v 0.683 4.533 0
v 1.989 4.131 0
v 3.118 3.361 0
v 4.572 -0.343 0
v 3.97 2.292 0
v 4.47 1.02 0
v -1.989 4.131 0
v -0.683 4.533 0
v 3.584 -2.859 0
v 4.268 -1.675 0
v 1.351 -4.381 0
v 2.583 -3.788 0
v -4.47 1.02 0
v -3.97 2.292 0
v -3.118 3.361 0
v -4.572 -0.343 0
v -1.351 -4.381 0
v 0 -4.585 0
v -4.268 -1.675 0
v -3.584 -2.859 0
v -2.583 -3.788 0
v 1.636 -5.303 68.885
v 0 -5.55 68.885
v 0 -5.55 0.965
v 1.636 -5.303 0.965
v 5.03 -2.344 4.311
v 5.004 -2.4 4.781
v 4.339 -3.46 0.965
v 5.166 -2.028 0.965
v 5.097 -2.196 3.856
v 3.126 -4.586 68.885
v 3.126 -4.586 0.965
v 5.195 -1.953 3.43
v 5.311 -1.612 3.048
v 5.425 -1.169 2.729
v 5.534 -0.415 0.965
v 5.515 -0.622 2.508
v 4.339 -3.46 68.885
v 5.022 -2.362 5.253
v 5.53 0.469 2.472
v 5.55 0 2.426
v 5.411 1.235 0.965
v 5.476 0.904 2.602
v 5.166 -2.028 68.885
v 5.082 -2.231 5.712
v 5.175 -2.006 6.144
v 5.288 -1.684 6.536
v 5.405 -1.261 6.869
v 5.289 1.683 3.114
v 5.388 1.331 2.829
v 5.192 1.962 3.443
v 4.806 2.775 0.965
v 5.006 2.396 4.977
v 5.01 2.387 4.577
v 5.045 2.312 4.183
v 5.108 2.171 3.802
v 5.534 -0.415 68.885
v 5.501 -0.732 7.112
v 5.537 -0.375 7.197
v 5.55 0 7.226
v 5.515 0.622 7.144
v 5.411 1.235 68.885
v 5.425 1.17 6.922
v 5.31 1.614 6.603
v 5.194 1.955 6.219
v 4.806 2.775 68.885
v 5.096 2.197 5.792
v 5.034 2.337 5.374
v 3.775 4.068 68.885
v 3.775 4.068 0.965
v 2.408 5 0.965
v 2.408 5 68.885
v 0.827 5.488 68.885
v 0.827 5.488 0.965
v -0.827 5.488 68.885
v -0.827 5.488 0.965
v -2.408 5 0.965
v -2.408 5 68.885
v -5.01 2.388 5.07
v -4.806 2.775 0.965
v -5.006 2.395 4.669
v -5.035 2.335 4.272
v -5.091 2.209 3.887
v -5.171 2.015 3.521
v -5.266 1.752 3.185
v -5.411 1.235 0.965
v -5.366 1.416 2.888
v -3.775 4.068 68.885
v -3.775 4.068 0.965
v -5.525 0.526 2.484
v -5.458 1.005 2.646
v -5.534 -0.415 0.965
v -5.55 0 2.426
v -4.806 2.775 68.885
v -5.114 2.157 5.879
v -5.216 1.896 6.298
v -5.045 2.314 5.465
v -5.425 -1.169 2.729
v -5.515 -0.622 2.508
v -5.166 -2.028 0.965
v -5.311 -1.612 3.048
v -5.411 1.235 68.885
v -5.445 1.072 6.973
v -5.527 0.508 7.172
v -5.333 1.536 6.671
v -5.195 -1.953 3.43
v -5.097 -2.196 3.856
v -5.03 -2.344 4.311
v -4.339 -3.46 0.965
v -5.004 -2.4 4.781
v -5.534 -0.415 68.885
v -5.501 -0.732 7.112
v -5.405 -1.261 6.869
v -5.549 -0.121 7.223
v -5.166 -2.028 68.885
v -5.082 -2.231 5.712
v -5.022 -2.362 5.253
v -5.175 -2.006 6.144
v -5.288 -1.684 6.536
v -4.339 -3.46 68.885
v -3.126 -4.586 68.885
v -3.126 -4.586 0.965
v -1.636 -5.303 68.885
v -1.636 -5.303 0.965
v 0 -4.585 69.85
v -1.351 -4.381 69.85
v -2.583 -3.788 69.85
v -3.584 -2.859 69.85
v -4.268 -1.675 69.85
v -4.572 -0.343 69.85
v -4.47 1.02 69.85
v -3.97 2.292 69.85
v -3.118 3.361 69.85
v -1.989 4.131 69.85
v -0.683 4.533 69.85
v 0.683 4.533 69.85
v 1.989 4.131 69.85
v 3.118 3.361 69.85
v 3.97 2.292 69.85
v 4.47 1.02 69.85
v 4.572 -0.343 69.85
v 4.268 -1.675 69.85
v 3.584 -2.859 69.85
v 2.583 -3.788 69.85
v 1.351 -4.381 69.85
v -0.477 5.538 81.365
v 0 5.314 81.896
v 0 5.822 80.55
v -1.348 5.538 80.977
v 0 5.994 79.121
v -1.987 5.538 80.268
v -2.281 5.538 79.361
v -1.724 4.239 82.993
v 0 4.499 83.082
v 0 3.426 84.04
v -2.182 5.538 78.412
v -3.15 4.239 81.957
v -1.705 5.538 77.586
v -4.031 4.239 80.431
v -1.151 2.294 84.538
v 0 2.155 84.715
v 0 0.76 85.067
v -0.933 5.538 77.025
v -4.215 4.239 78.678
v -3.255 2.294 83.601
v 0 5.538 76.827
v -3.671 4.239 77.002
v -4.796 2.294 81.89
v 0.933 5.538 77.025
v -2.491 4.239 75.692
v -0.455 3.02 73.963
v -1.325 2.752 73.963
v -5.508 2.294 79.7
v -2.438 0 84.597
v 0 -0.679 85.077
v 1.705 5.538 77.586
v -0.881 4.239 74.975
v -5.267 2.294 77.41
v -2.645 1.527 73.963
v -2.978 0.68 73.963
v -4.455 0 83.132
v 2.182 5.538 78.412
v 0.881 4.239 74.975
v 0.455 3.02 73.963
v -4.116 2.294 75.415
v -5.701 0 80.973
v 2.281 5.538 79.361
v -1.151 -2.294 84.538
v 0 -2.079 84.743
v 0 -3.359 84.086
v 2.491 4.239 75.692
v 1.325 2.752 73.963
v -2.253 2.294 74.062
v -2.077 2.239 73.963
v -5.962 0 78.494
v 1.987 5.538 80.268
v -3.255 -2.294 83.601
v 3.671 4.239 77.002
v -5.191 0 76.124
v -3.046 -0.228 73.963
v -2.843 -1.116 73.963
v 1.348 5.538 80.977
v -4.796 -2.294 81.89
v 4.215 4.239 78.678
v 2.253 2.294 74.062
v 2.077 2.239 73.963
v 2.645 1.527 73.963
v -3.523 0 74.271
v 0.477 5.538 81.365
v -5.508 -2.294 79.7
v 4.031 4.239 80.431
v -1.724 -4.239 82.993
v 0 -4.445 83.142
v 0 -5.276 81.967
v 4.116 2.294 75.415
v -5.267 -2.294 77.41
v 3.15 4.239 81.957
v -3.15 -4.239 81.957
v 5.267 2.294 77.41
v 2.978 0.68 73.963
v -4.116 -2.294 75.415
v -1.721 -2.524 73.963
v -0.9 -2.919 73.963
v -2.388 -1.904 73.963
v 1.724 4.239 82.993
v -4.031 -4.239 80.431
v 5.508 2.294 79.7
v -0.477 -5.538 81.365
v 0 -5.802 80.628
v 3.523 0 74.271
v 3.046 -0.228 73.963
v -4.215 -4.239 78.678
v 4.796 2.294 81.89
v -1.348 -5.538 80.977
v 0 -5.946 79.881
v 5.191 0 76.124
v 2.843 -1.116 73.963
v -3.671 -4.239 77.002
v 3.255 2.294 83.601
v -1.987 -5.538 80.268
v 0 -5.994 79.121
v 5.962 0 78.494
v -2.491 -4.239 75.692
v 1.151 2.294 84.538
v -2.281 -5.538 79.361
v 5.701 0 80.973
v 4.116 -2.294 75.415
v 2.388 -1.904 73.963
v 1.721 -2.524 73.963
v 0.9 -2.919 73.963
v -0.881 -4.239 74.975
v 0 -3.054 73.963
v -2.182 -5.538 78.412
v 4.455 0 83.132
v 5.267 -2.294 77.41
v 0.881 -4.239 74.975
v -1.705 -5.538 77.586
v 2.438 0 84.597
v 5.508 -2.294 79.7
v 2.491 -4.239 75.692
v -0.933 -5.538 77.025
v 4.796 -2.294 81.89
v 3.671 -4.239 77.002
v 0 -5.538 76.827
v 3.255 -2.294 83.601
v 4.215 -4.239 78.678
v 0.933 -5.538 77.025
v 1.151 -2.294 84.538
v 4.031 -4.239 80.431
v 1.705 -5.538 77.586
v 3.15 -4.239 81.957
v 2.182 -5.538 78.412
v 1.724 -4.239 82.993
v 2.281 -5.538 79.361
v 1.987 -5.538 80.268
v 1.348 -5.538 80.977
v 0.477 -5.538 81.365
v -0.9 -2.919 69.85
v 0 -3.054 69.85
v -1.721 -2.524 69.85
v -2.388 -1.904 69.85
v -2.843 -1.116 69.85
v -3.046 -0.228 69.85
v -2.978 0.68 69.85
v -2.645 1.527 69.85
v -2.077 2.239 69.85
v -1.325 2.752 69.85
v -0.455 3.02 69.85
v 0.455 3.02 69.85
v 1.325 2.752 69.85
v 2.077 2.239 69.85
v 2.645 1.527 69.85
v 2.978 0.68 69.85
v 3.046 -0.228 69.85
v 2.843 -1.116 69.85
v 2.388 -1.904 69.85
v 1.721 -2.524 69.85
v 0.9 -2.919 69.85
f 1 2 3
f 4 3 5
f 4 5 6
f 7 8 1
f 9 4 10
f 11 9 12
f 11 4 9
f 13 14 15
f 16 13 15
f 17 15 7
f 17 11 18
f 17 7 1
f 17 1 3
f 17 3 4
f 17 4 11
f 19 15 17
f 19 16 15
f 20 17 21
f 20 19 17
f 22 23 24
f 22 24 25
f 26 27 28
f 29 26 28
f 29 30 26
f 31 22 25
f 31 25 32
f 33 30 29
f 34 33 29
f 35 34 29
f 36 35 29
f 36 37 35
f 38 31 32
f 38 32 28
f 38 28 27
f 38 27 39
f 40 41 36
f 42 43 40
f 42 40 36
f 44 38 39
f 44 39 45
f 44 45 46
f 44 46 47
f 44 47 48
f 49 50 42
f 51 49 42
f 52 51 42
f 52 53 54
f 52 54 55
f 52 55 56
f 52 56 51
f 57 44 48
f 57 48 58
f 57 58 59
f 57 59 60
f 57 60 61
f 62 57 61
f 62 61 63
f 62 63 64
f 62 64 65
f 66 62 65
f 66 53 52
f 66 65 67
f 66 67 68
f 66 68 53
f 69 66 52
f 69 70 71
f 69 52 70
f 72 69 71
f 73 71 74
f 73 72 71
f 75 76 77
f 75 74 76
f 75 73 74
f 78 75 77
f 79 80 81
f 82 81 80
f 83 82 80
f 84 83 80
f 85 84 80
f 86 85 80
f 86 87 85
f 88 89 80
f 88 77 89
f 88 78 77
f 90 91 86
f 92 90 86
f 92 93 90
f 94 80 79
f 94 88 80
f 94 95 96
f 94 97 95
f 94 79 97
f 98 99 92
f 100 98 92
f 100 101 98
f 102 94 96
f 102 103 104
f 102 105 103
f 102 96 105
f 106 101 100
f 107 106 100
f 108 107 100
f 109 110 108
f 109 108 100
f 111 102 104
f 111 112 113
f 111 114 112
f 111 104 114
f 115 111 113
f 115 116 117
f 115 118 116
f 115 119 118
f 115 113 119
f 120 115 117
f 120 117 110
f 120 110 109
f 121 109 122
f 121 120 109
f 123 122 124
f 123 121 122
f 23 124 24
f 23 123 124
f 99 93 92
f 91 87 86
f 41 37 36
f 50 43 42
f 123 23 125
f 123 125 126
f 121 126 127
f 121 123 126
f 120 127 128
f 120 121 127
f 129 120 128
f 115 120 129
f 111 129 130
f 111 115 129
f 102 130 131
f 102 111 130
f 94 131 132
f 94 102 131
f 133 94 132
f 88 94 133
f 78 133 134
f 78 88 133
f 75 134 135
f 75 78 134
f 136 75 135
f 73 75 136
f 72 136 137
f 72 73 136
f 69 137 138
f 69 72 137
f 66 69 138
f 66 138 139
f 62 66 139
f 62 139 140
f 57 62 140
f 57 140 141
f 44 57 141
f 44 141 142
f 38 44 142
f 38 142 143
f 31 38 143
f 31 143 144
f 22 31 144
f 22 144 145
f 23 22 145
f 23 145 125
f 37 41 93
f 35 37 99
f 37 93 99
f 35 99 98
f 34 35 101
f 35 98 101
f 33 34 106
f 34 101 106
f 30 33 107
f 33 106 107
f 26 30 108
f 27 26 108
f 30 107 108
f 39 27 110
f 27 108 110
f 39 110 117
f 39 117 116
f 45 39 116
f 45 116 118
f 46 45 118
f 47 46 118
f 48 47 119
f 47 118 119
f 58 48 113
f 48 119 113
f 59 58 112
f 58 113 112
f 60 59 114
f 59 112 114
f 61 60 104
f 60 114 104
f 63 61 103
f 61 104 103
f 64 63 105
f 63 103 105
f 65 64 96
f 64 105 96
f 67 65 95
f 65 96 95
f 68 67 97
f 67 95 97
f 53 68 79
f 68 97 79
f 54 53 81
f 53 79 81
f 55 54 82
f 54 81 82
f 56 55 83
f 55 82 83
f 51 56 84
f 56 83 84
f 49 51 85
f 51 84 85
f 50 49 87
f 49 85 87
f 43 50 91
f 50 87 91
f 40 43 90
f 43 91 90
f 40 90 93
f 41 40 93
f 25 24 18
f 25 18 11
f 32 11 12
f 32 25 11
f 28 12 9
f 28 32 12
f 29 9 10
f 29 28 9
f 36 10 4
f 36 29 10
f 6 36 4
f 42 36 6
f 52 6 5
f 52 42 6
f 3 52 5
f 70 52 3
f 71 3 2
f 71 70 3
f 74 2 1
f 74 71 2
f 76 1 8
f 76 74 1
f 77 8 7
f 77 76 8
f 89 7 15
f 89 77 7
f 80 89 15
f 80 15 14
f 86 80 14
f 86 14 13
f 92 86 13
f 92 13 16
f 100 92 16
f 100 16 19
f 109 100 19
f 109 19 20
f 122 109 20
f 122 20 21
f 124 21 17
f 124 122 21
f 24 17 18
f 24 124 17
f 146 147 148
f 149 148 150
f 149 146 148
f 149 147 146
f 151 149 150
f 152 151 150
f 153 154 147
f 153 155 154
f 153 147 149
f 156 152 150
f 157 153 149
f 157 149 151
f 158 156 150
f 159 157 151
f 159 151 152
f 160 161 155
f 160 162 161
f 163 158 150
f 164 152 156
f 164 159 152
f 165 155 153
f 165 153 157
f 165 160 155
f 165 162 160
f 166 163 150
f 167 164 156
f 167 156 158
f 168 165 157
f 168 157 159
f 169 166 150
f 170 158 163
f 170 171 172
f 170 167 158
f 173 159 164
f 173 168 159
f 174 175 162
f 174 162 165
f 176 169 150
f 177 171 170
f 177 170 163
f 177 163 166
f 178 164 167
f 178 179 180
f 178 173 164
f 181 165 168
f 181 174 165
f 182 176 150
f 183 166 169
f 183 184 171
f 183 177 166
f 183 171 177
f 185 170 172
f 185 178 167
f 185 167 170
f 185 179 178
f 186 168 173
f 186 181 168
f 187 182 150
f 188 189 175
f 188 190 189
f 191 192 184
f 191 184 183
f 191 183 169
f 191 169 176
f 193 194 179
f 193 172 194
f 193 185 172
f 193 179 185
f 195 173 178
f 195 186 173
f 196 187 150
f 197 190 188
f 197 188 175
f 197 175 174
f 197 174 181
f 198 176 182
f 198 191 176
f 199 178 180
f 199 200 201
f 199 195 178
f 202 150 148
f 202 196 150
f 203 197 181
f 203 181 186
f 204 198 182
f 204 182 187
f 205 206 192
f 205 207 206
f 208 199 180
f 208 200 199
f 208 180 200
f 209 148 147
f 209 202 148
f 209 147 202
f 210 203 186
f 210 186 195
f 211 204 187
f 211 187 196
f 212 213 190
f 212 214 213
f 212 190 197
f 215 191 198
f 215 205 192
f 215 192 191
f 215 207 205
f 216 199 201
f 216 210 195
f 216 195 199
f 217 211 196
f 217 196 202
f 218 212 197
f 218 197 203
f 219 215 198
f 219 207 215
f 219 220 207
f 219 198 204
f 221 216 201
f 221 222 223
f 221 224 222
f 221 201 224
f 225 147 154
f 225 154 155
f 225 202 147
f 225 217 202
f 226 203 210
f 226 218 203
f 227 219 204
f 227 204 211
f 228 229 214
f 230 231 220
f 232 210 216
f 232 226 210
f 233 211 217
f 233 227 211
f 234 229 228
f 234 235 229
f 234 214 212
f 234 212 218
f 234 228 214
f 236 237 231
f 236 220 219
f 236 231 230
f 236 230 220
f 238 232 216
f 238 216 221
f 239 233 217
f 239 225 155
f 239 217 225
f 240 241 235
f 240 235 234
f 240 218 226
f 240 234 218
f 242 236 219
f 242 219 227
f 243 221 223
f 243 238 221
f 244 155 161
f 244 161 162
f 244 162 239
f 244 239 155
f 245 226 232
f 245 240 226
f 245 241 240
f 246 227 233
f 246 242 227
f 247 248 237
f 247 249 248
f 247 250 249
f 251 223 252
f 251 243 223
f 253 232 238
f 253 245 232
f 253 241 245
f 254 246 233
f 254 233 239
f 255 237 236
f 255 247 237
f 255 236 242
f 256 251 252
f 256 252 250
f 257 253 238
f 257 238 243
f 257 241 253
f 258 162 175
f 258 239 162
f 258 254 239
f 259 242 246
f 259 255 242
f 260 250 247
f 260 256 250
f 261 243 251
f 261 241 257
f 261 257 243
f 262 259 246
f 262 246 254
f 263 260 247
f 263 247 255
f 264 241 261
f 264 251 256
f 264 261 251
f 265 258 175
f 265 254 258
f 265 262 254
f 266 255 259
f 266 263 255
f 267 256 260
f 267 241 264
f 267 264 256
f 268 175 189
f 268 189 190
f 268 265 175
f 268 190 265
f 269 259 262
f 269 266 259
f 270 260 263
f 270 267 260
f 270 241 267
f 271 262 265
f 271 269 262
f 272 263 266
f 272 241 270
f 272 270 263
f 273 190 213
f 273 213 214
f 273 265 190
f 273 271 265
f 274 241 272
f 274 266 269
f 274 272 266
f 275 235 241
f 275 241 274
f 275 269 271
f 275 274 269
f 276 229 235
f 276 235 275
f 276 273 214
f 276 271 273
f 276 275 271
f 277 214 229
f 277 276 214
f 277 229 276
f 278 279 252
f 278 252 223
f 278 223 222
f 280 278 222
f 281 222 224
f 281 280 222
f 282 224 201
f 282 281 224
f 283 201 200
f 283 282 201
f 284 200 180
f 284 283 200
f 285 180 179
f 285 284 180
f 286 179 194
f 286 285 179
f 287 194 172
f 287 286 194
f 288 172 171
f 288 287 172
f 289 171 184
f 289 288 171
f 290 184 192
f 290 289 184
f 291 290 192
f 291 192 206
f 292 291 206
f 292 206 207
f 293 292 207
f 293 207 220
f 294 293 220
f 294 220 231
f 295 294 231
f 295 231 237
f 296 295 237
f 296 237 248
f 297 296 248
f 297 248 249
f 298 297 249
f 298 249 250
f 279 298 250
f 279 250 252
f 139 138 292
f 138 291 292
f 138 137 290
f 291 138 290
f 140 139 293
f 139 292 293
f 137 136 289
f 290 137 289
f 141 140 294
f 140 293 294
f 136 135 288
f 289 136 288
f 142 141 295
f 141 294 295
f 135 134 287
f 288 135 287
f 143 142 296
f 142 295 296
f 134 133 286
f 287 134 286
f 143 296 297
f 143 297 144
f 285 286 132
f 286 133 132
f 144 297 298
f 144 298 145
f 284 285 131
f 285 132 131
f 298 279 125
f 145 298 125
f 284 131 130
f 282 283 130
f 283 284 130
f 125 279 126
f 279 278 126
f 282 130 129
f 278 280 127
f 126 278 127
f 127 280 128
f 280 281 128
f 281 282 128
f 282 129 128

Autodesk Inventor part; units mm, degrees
ref_plane "XZ Plane" through (0, 0, 0) normal (0, 1, 0) x (-1, 0, 0)
ref_plane "XY Plane" through (0, 0, 0) normal (0, 0, 1) x (1, 0, 0)
sketch "Sketch1" plane through (0, 0, 0) normal (1, 0, 0) x (0, 1, 0)
  line L0 (-5.5499, 0) -> (-5.5499, 69.85)
  line L1 (0, 0) -> (-5.5499, 0)
  line L2 (-3.0543, 69.85) -> (-5.5499, 69.85)
  line L3 (0, 73.9634) -> (0, 0)
  line L4 (-3.0543, 73.9634) -> (-3.0543, 69.85)
  line L5 (-3.0543, 73.9634) -> (0, 73.9634)
  dimension "d1" = 73.9634
  dimension "d3" = 5.5499
  dimension "d4" = 69.85
  dimension "d6" = 4.1134
  dimension "d8" = 2.4956
revolve "Revolution1" add sketch "Sketch1" angle 360 about axis through (0, 0, 73.9634) along (0, 0, -1)
sketch "Sketch2" plane through (0, 0, 0) normal (1, 0, 0) x (0, 1, 0)
  line L0 (3.0543, 73.9634) -> (-3.0543, 73.9634) construction
  arc A0 (5.9944, 79.121) -> (-5.9944, 79.121) centre (0, 79.121) ccw
  line L1 (5.5499, 69.85) -> (-5.5499, 69.85) projected
  line L2 (5.9944, 79.121) -> (-5.9944, 79.121)
  point P0 (0, 0)
  point P1 (0, 73.9634)
  point P2 (0, 69.85)
  dimension "d12" = 11.9888
  dimension "d21" = 5.1576
  dimension "d22" = 9.271
  dimension "d23" = 6.1087
revolve "Revolution2" add sketch "Sketch2" angle 360 about axis through (0, 5.9944, 79.121) along (0, -1, 0)
chamfer "Chamfer1" distance 0.9652 angle 45 2 edges at (0, 5.5499, 69.85) (0, 5.5499, 0)
ref_plane "Work Plane1" through (5.5499, 0, 34.925) normal (1, 0, 0) x (0, 1, 0)
sketch "Sketch3" plane through (5.5499, 0, 34.925) normal (1, 0, 0) x (0, 1, 0)
  point P0 (0, -34.925)
  point P1 (0, -30.099)
  dimension "d30" = 4.826
hole "Hole1" at (5.5499, 0, 4.826) direction (-1, 0, 0) diameter 4.8006 end through all
properties part number "Ball_2"
